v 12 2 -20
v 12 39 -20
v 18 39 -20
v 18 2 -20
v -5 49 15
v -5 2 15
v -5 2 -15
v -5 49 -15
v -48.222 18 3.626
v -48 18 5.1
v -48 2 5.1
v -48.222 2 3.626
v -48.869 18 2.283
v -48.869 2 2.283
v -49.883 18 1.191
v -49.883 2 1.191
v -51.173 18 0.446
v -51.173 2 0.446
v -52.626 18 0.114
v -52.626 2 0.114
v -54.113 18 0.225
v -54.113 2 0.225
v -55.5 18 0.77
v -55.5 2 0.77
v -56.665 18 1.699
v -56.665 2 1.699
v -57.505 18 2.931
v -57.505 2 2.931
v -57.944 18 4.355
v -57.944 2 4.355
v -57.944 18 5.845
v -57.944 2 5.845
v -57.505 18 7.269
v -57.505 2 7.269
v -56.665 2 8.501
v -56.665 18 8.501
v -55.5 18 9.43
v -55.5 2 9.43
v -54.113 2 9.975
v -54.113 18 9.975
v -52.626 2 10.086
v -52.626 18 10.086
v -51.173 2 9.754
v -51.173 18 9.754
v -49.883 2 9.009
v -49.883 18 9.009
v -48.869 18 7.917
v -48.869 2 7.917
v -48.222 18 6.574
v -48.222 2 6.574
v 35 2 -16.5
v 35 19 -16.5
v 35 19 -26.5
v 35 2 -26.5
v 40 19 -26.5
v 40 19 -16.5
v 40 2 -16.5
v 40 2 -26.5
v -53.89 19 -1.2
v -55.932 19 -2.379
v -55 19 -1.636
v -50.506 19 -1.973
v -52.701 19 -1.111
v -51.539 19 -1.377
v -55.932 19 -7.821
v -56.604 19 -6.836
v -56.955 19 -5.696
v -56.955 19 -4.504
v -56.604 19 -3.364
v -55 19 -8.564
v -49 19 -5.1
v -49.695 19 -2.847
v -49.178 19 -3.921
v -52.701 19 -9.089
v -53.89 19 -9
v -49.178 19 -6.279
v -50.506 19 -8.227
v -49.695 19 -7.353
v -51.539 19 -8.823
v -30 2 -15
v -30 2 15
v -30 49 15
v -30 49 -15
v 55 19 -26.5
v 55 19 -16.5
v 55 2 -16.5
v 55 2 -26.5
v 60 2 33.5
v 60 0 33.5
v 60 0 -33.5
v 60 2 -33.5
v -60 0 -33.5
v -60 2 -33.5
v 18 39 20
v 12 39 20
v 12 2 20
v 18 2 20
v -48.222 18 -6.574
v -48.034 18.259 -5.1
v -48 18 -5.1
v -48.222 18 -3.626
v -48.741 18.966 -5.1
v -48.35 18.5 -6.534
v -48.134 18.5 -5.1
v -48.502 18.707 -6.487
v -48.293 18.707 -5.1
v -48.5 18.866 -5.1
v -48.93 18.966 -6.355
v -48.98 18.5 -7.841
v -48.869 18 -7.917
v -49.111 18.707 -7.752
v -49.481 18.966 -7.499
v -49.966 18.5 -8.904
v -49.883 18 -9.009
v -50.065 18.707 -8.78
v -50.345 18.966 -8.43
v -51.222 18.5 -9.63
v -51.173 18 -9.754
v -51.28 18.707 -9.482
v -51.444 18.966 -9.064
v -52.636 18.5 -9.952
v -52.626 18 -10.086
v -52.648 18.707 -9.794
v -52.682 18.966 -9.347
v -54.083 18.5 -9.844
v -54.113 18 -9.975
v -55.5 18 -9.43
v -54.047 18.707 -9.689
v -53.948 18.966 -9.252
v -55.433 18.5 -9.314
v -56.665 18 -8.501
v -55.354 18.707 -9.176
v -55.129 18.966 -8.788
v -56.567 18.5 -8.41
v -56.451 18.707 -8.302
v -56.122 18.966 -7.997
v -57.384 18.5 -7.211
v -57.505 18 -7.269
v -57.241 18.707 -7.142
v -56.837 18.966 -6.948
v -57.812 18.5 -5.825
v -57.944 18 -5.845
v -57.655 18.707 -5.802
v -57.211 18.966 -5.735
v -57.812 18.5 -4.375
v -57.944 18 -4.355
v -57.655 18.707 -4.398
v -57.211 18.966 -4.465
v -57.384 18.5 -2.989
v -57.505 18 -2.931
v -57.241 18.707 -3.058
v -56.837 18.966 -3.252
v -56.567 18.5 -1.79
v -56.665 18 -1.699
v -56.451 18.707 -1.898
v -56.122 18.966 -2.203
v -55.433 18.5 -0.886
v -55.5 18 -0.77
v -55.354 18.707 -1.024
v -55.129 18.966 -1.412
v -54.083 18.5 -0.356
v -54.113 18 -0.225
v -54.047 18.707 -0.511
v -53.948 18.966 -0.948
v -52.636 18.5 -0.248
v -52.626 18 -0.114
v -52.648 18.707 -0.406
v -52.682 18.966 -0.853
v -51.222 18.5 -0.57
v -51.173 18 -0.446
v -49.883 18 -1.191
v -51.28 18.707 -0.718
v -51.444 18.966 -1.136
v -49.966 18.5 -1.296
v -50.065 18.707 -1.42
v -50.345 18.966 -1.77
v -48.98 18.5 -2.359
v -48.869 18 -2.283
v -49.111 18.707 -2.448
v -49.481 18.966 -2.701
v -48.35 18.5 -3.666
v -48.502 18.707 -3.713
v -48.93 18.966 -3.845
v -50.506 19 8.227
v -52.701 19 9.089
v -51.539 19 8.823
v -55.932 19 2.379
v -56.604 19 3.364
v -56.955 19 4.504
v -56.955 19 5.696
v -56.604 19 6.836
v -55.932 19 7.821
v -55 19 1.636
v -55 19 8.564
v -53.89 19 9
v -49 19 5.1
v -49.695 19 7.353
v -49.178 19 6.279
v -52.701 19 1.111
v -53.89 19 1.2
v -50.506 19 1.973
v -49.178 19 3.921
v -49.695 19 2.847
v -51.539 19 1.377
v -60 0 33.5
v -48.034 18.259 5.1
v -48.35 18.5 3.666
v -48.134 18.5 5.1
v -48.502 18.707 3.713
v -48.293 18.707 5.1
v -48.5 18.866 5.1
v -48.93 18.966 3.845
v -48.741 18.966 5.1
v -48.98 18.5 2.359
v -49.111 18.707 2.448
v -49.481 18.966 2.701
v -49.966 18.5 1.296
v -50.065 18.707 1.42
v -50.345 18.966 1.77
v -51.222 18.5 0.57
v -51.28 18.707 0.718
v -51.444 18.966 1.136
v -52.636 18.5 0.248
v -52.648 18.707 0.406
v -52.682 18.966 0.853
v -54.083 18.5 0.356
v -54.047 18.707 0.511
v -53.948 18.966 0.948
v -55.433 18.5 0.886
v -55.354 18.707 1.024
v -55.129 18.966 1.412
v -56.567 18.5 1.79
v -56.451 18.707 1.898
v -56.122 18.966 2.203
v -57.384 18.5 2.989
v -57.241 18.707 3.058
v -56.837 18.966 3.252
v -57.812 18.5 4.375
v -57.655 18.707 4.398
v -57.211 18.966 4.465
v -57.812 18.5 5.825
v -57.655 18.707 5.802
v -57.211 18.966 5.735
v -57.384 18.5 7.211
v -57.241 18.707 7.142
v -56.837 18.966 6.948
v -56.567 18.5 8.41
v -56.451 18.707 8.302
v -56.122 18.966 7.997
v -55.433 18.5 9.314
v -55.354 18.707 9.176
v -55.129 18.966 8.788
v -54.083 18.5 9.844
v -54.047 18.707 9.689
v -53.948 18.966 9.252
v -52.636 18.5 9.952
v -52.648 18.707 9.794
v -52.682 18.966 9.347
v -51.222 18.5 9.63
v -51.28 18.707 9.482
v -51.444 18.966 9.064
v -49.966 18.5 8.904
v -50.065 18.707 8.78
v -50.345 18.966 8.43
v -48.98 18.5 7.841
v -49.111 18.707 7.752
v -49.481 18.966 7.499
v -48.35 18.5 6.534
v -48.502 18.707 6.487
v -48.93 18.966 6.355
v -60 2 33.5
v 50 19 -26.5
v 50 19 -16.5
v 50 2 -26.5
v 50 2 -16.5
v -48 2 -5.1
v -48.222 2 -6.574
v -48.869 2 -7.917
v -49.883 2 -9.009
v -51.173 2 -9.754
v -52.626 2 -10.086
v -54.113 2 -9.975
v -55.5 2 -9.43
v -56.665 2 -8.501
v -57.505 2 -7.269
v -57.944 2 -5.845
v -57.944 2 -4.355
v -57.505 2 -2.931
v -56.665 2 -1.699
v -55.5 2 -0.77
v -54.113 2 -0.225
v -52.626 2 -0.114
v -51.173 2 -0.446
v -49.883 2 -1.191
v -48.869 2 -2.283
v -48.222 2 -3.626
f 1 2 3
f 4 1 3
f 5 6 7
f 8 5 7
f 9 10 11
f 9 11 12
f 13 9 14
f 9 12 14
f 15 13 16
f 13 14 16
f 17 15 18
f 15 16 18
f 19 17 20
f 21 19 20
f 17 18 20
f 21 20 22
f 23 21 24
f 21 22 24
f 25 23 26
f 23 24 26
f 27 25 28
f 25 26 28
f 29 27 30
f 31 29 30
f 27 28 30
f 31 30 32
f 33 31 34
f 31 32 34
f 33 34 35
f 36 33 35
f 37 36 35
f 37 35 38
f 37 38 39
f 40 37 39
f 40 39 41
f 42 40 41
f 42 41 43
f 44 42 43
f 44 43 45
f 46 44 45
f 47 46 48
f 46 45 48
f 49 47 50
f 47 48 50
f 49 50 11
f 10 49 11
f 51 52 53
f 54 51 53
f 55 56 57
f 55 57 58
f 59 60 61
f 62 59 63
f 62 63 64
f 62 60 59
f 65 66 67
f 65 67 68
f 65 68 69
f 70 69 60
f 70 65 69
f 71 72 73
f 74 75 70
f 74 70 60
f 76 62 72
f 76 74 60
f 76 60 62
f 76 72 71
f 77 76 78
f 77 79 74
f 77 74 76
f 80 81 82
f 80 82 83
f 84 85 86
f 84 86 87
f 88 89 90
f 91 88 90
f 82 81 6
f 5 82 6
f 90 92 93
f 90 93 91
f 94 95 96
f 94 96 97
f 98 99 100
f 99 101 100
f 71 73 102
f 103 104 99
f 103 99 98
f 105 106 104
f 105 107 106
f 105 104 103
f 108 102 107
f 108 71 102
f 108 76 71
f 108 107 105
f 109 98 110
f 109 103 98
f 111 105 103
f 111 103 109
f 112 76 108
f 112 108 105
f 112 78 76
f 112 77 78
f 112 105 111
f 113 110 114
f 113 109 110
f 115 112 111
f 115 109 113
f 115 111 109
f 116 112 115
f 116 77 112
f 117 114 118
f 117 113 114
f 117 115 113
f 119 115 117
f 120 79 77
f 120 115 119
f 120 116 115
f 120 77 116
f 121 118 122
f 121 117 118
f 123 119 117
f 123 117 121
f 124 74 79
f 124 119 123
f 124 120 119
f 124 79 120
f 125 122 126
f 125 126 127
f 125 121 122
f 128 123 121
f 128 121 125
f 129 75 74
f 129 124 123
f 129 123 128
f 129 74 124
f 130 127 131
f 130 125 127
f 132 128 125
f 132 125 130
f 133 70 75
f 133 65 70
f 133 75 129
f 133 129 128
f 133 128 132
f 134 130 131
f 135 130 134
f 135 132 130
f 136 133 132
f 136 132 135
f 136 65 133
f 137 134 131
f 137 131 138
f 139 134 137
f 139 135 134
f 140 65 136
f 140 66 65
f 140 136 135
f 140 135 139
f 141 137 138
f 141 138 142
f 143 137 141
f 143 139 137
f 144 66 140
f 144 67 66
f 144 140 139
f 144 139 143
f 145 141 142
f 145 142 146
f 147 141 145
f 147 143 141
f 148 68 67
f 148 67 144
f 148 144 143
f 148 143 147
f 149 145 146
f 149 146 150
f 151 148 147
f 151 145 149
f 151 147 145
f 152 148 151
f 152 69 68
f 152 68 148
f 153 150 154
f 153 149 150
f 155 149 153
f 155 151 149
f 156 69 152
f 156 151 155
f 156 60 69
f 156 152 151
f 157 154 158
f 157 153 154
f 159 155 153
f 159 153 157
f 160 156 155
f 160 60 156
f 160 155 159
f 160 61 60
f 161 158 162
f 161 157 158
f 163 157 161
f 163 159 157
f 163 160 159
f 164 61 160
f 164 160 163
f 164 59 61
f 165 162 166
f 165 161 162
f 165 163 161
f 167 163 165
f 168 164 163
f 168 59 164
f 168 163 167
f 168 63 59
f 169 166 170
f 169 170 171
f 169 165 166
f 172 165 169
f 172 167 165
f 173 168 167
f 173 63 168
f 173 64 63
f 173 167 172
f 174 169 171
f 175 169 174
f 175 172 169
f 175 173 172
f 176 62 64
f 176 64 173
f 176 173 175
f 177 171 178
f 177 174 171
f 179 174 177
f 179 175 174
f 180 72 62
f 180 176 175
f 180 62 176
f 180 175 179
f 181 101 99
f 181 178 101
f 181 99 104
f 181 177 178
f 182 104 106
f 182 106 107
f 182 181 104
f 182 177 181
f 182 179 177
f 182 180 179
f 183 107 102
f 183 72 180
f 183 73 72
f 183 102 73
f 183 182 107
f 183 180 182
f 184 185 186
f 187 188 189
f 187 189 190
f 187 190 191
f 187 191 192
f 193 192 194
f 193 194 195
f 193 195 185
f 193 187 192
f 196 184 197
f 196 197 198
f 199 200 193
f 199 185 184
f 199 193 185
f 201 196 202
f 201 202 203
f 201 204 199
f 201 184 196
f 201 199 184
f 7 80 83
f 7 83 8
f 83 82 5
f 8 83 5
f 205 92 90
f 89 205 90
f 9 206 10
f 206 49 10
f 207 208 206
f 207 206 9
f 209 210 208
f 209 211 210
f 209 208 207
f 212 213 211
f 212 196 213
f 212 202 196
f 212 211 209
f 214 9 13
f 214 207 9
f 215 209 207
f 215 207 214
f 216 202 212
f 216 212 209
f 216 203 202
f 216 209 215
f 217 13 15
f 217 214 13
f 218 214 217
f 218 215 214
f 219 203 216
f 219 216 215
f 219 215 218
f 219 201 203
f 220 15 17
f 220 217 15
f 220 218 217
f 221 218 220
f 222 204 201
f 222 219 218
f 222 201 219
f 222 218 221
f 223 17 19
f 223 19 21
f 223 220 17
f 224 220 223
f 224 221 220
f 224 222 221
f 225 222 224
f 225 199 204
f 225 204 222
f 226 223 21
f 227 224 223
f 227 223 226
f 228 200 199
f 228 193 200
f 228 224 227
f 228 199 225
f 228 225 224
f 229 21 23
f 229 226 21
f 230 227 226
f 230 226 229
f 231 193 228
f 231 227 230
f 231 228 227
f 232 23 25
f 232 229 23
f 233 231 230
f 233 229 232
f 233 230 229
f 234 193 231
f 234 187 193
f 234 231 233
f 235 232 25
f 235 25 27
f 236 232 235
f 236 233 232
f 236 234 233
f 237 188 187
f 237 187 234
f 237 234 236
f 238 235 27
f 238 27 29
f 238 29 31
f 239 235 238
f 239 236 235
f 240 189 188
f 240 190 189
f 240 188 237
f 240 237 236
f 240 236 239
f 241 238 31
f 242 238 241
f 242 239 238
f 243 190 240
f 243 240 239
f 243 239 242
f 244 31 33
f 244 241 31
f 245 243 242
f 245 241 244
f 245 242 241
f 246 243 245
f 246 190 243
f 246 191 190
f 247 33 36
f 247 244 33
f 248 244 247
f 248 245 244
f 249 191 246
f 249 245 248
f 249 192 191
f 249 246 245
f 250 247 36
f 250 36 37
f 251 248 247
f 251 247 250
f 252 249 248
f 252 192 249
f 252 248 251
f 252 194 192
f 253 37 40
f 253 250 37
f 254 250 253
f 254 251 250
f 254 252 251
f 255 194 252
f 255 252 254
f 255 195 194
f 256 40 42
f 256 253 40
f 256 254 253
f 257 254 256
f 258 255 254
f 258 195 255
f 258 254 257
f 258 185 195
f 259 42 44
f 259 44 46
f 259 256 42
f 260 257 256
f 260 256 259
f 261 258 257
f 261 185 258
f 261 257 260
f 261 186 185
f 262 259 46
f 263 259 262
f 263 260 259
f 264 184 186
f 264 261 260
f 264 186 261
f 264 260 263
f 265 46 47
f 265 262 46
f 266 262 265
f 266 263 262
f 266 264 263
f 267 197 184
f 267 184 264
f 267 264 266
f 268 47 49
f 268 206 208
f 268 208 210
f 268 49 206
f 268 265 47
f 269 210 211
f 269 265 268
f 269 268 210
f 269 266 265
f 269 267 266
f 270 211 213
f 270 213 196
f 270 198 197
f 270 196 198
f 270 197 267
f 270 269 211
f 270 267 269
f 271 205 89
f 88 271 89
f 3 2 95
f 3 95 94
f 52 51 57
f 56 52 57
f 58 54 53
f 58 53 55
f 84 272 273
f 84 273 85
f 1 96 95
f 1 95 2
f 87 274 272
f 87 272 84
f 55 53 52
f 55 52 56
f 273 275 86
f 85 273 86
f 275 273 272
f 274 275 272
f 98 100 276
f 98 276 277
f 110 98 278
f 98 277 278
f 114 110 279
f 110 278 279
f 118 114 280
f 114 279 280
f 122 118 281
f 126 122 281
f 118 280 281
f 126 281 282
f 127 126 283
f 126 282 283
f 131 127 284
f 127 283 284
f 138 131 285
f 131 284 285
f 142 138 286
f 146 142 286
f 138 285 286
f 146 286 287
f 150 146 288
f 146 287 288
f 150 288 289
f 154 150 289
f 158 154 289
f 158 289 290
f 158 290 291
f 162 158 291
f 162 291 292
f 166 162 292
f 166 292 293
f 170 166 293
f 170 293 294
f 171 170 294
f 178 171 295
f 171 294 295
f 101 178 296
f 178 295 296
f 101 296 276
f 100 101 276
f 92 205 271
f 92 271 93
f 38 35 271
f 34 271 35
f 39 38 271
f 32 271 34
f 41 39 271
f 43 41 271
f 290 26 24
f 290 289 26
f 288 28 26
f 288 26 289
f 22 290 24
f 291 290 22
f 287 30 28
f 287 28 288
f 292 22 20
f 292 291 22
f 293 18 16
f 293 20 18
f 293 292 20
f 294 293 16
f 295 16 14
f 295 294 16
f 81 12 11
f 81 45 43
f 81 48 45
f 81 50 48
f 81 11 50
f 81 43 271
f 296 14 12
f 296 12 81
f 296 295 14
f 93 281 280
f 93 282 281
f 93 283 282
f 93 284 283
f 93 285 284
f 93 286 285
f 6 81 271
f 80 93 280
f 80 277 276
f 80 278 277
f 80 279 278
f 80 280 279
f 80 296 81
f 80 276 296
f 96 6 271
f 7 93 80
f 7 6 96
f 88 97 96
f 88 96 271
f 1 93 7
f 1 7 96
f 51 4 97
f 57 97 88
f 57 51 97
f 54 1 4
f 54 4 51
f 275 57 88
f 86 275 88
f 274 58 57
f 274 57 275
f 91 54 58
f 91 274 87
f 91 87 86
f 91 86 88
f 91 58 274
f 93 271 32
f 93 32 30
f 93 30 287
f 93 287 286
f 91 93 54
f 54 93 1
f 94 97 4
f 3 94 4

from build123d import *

# Parameters (mm, degrees)
SKETCH1_W           = 120
SKETCH1_H           = 67
BOSS_EXTRUDE1_DEPTH = 2
SKETCH2_R           = 5
BOSS_EXTRUDE2_DEPTH = 17
FILLET1_R           = 1
SKETCH3_W           = 25
SKETCH3_H           = 30
BOSS_EXTRUDE3_DEPTH = 47
SKETCH3_3_W         = 6
SKETCH3_3_H         = 40
BOSS_EXTRUDE4_DEPTH = 37
SKETCH3_4_W         = 5
SKETCH3_4_H         = 10
BOSS_EXTRUDE5_DEPTH = 17


with BuildPart() as part:
    # Sketch1 → Boss-Extrude1 (new body)
    with BuildSketch(Plane(origin=(0, 0, 0), x_dir=(1, 0, 0), z_dir=(0, 1, 0))):
        Rectangle(SKETCH1_W, SKETCH1_H)
    extrude(amount=BOSS_EXTRUDE1_DEPTH)

    # Sketch2 → Boss-Extrude2 (add)
    with BuildSketch(Plane(origin=(0, 2, 0), x_dir=(1, 0, 0), z_dir=(0, 1, 0))):
        with Locations((-53, 5.1)):
            Circle(SKETCH2_R)
        with Locations((-53, -5.1)):
            Circle(SKETCH2_R)
    extrude(amount=BOSS_EXTRUDE2_DEPTH)

    # Fillet1
    fillet1_edges = [part.edges().sort_by_distance(p)[0] for p in [
        (-58, 19, -5.1),
        (-58, 19, 5.1),
    ]]
    fillet(fillet1_edges, radius=FILLET1_R)

    # Sketch3 → Boss-Extrude3 (add)
    with BuildSketch(Plane(origin=(0, 2, 0), x_dir=(1, 0, 0), z_dir=(0, 1, 0))):
        with Locations((-17.5, 0)):
            Rectangle(SKETCH3_W, SKETCH3_H)
    extrude(amount=BOSS_EXTRUDE3_DEPTH)

    # Sketch3<3> → Boss-Extrude4 (add)
    with BuildSketch(Plane(origin=(0, 2, 0), x_dir=(1, 0, 0), z_dir=(0, 1, 0))):
        with Locations((15, 0)):
            Rectangle(SKETCH3_3_W, SKETCH3_3_H)
    extrude(amount=BOSS_EXTRUDE4_DEPTH)

    # Sketch3<4> → Boss-Extrude5 (add)
    with BuildSketch(Plane(origin=(0, 2, 0), x_dir=(1, 0, 0), z_dir=(0, 1, 0))):
        with Locations((37.5, 21.5)):
            Rectangle(SKETCH3_4_W, SKETCH3_4_H)
        with Locations((52.5, 21.5)):
            Rectangle(SKETCH3_4_W, SKETCH3_4_H)
    extrude(amount=BOSS_EXTRUDE5_DEPTH)


solid = part.part
